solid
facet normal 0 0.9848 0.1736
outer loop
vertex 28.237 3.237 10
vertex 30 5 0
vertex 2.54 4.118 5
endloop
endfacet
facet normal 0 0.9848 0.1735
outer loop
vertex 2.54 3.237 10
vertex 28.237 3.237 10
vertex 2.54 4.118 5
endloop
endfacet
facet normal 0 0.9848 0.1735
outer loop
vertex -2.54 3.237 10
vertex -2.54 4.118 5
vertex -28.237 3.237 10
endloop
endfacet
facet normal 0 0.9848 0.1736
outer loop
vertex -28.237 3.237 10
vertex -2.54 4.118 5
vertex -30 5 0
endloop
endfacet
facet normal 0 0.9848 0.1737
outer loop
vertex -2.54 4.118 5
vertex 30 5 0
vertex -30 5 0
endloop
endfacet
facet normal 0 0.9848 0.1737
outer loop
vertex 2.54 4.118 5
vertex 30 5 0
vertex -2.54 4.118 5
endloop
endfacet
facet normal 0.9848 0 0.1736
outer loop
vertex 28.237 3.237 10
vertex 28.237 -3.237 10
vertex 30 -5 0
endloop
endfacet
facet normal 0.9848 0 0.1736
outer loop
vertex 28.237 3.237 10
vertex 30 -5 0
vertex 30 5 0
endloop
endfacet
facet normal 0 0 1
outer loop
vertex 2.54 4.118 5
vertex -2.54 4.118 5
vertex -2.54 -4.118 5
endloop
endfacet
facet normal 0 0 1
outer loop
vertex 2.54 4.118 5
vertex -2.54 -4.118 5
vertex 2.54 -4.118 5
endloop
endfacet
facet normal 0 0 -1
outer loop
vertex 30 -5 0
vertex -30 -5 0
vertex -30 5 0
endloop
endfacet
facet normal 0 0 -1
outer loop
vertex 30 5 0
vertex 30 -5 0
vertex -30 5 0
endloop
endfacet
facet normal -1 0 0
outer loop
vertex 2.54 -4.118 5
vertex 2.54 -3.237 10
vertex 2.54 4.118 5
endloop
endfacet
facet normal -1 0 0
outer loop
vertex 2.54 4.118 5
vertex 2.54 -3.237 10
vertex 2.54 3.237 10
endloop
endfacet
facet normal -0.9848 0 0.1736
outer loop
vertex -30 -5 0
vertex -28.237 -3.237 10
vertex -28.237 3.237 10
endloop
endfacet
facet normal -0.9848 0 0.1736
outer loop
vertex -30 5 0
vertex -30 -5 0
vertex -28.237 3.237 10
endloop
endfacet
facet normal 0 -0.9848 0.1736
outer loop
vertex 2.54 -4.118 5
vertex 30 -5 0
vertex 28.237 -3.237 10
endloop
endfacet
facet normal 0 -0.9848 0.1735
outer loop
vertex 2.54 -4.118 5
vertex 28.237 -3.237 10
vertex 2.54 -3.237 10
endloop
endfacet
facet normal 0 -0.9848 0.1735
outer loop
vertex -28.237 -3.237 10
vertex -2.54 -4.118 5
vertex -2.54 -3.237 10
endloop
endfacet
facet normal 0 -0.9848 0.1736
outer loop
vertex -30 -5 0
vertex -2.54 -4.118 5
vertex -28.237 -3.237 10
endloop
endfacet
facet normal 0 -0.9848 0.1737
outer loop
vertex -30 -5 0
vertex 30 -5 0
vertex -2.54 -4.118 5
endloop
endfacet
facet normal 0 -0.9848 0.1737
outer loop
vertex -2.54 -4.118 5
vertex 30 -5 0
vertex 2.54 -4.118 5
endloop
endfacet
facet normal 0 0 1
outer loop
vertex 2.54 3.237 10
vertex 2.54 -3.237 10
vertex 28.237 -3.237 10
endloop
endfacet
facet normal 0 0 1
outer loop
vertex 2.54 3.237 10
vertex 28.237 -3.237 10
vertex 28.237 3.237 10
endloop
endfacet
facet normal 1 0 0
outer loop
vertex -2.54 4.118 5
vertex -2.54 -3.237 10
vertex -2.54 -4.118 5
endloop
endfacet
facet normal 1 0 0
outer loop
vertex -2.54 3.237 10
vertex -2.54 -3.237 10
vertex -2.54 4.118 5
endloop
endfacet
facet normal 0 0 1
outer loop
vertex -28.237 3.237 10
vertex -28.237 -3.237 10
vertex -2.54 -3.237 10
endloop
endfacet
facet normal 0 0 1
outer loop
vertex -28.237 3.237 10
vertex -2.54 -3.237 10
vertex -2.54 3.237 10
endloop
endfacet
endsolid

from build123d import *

# Parameters (mm, degrees)
SKETCH1_W           = 10
SKETCH1_H           = 60
BOSS_EXTRUDE1_DEPTH = 10
DRAFT1_ANGLE        = -10
SKETCH2_W           = 5.08
SKETCH2_H           = 30
CUT_EXTRUDE1_DEPTH  = 5


with BuildPart() as part:
    # Sketch1 → Boss-Extrude1 (new body)
    with BuildSketch(Plane(origin=(0, 0, 0), x_dir=(0, 1, 0), z_dir=(0, 0, 1))):
        Rectangle(SKETCH1_W, SKETCH1_H)
    extrude(amount=BOSS_EXTRUDE1_DEPTH)

    # Draft1
    draft1_faces = [part.faces().sort_by_distance(p)[0] for p in [
        (-30, 0, 5),
        (0, -5, 5),
        (0, 5, 5),
        (30, 0, 5),
    ]]
    draft(draft1_faces, Plane(origin=(0, 0, 0), x_dir=(-1, 0, 0), z_dir=(0, 0, -1)), DRAFT1_ANGLE)

    # Sketch2 → Cut-Extrude1 (cut)
    with BuildSketch(Plane.XY.offset(10)):
        Rectangle(SKETCH2_W, SKETCH2_H)
    extrude(amount=-CUT_EXTRUDE1_DEPTH, mode=Mode.SUBTRACT)


solid = part.part
